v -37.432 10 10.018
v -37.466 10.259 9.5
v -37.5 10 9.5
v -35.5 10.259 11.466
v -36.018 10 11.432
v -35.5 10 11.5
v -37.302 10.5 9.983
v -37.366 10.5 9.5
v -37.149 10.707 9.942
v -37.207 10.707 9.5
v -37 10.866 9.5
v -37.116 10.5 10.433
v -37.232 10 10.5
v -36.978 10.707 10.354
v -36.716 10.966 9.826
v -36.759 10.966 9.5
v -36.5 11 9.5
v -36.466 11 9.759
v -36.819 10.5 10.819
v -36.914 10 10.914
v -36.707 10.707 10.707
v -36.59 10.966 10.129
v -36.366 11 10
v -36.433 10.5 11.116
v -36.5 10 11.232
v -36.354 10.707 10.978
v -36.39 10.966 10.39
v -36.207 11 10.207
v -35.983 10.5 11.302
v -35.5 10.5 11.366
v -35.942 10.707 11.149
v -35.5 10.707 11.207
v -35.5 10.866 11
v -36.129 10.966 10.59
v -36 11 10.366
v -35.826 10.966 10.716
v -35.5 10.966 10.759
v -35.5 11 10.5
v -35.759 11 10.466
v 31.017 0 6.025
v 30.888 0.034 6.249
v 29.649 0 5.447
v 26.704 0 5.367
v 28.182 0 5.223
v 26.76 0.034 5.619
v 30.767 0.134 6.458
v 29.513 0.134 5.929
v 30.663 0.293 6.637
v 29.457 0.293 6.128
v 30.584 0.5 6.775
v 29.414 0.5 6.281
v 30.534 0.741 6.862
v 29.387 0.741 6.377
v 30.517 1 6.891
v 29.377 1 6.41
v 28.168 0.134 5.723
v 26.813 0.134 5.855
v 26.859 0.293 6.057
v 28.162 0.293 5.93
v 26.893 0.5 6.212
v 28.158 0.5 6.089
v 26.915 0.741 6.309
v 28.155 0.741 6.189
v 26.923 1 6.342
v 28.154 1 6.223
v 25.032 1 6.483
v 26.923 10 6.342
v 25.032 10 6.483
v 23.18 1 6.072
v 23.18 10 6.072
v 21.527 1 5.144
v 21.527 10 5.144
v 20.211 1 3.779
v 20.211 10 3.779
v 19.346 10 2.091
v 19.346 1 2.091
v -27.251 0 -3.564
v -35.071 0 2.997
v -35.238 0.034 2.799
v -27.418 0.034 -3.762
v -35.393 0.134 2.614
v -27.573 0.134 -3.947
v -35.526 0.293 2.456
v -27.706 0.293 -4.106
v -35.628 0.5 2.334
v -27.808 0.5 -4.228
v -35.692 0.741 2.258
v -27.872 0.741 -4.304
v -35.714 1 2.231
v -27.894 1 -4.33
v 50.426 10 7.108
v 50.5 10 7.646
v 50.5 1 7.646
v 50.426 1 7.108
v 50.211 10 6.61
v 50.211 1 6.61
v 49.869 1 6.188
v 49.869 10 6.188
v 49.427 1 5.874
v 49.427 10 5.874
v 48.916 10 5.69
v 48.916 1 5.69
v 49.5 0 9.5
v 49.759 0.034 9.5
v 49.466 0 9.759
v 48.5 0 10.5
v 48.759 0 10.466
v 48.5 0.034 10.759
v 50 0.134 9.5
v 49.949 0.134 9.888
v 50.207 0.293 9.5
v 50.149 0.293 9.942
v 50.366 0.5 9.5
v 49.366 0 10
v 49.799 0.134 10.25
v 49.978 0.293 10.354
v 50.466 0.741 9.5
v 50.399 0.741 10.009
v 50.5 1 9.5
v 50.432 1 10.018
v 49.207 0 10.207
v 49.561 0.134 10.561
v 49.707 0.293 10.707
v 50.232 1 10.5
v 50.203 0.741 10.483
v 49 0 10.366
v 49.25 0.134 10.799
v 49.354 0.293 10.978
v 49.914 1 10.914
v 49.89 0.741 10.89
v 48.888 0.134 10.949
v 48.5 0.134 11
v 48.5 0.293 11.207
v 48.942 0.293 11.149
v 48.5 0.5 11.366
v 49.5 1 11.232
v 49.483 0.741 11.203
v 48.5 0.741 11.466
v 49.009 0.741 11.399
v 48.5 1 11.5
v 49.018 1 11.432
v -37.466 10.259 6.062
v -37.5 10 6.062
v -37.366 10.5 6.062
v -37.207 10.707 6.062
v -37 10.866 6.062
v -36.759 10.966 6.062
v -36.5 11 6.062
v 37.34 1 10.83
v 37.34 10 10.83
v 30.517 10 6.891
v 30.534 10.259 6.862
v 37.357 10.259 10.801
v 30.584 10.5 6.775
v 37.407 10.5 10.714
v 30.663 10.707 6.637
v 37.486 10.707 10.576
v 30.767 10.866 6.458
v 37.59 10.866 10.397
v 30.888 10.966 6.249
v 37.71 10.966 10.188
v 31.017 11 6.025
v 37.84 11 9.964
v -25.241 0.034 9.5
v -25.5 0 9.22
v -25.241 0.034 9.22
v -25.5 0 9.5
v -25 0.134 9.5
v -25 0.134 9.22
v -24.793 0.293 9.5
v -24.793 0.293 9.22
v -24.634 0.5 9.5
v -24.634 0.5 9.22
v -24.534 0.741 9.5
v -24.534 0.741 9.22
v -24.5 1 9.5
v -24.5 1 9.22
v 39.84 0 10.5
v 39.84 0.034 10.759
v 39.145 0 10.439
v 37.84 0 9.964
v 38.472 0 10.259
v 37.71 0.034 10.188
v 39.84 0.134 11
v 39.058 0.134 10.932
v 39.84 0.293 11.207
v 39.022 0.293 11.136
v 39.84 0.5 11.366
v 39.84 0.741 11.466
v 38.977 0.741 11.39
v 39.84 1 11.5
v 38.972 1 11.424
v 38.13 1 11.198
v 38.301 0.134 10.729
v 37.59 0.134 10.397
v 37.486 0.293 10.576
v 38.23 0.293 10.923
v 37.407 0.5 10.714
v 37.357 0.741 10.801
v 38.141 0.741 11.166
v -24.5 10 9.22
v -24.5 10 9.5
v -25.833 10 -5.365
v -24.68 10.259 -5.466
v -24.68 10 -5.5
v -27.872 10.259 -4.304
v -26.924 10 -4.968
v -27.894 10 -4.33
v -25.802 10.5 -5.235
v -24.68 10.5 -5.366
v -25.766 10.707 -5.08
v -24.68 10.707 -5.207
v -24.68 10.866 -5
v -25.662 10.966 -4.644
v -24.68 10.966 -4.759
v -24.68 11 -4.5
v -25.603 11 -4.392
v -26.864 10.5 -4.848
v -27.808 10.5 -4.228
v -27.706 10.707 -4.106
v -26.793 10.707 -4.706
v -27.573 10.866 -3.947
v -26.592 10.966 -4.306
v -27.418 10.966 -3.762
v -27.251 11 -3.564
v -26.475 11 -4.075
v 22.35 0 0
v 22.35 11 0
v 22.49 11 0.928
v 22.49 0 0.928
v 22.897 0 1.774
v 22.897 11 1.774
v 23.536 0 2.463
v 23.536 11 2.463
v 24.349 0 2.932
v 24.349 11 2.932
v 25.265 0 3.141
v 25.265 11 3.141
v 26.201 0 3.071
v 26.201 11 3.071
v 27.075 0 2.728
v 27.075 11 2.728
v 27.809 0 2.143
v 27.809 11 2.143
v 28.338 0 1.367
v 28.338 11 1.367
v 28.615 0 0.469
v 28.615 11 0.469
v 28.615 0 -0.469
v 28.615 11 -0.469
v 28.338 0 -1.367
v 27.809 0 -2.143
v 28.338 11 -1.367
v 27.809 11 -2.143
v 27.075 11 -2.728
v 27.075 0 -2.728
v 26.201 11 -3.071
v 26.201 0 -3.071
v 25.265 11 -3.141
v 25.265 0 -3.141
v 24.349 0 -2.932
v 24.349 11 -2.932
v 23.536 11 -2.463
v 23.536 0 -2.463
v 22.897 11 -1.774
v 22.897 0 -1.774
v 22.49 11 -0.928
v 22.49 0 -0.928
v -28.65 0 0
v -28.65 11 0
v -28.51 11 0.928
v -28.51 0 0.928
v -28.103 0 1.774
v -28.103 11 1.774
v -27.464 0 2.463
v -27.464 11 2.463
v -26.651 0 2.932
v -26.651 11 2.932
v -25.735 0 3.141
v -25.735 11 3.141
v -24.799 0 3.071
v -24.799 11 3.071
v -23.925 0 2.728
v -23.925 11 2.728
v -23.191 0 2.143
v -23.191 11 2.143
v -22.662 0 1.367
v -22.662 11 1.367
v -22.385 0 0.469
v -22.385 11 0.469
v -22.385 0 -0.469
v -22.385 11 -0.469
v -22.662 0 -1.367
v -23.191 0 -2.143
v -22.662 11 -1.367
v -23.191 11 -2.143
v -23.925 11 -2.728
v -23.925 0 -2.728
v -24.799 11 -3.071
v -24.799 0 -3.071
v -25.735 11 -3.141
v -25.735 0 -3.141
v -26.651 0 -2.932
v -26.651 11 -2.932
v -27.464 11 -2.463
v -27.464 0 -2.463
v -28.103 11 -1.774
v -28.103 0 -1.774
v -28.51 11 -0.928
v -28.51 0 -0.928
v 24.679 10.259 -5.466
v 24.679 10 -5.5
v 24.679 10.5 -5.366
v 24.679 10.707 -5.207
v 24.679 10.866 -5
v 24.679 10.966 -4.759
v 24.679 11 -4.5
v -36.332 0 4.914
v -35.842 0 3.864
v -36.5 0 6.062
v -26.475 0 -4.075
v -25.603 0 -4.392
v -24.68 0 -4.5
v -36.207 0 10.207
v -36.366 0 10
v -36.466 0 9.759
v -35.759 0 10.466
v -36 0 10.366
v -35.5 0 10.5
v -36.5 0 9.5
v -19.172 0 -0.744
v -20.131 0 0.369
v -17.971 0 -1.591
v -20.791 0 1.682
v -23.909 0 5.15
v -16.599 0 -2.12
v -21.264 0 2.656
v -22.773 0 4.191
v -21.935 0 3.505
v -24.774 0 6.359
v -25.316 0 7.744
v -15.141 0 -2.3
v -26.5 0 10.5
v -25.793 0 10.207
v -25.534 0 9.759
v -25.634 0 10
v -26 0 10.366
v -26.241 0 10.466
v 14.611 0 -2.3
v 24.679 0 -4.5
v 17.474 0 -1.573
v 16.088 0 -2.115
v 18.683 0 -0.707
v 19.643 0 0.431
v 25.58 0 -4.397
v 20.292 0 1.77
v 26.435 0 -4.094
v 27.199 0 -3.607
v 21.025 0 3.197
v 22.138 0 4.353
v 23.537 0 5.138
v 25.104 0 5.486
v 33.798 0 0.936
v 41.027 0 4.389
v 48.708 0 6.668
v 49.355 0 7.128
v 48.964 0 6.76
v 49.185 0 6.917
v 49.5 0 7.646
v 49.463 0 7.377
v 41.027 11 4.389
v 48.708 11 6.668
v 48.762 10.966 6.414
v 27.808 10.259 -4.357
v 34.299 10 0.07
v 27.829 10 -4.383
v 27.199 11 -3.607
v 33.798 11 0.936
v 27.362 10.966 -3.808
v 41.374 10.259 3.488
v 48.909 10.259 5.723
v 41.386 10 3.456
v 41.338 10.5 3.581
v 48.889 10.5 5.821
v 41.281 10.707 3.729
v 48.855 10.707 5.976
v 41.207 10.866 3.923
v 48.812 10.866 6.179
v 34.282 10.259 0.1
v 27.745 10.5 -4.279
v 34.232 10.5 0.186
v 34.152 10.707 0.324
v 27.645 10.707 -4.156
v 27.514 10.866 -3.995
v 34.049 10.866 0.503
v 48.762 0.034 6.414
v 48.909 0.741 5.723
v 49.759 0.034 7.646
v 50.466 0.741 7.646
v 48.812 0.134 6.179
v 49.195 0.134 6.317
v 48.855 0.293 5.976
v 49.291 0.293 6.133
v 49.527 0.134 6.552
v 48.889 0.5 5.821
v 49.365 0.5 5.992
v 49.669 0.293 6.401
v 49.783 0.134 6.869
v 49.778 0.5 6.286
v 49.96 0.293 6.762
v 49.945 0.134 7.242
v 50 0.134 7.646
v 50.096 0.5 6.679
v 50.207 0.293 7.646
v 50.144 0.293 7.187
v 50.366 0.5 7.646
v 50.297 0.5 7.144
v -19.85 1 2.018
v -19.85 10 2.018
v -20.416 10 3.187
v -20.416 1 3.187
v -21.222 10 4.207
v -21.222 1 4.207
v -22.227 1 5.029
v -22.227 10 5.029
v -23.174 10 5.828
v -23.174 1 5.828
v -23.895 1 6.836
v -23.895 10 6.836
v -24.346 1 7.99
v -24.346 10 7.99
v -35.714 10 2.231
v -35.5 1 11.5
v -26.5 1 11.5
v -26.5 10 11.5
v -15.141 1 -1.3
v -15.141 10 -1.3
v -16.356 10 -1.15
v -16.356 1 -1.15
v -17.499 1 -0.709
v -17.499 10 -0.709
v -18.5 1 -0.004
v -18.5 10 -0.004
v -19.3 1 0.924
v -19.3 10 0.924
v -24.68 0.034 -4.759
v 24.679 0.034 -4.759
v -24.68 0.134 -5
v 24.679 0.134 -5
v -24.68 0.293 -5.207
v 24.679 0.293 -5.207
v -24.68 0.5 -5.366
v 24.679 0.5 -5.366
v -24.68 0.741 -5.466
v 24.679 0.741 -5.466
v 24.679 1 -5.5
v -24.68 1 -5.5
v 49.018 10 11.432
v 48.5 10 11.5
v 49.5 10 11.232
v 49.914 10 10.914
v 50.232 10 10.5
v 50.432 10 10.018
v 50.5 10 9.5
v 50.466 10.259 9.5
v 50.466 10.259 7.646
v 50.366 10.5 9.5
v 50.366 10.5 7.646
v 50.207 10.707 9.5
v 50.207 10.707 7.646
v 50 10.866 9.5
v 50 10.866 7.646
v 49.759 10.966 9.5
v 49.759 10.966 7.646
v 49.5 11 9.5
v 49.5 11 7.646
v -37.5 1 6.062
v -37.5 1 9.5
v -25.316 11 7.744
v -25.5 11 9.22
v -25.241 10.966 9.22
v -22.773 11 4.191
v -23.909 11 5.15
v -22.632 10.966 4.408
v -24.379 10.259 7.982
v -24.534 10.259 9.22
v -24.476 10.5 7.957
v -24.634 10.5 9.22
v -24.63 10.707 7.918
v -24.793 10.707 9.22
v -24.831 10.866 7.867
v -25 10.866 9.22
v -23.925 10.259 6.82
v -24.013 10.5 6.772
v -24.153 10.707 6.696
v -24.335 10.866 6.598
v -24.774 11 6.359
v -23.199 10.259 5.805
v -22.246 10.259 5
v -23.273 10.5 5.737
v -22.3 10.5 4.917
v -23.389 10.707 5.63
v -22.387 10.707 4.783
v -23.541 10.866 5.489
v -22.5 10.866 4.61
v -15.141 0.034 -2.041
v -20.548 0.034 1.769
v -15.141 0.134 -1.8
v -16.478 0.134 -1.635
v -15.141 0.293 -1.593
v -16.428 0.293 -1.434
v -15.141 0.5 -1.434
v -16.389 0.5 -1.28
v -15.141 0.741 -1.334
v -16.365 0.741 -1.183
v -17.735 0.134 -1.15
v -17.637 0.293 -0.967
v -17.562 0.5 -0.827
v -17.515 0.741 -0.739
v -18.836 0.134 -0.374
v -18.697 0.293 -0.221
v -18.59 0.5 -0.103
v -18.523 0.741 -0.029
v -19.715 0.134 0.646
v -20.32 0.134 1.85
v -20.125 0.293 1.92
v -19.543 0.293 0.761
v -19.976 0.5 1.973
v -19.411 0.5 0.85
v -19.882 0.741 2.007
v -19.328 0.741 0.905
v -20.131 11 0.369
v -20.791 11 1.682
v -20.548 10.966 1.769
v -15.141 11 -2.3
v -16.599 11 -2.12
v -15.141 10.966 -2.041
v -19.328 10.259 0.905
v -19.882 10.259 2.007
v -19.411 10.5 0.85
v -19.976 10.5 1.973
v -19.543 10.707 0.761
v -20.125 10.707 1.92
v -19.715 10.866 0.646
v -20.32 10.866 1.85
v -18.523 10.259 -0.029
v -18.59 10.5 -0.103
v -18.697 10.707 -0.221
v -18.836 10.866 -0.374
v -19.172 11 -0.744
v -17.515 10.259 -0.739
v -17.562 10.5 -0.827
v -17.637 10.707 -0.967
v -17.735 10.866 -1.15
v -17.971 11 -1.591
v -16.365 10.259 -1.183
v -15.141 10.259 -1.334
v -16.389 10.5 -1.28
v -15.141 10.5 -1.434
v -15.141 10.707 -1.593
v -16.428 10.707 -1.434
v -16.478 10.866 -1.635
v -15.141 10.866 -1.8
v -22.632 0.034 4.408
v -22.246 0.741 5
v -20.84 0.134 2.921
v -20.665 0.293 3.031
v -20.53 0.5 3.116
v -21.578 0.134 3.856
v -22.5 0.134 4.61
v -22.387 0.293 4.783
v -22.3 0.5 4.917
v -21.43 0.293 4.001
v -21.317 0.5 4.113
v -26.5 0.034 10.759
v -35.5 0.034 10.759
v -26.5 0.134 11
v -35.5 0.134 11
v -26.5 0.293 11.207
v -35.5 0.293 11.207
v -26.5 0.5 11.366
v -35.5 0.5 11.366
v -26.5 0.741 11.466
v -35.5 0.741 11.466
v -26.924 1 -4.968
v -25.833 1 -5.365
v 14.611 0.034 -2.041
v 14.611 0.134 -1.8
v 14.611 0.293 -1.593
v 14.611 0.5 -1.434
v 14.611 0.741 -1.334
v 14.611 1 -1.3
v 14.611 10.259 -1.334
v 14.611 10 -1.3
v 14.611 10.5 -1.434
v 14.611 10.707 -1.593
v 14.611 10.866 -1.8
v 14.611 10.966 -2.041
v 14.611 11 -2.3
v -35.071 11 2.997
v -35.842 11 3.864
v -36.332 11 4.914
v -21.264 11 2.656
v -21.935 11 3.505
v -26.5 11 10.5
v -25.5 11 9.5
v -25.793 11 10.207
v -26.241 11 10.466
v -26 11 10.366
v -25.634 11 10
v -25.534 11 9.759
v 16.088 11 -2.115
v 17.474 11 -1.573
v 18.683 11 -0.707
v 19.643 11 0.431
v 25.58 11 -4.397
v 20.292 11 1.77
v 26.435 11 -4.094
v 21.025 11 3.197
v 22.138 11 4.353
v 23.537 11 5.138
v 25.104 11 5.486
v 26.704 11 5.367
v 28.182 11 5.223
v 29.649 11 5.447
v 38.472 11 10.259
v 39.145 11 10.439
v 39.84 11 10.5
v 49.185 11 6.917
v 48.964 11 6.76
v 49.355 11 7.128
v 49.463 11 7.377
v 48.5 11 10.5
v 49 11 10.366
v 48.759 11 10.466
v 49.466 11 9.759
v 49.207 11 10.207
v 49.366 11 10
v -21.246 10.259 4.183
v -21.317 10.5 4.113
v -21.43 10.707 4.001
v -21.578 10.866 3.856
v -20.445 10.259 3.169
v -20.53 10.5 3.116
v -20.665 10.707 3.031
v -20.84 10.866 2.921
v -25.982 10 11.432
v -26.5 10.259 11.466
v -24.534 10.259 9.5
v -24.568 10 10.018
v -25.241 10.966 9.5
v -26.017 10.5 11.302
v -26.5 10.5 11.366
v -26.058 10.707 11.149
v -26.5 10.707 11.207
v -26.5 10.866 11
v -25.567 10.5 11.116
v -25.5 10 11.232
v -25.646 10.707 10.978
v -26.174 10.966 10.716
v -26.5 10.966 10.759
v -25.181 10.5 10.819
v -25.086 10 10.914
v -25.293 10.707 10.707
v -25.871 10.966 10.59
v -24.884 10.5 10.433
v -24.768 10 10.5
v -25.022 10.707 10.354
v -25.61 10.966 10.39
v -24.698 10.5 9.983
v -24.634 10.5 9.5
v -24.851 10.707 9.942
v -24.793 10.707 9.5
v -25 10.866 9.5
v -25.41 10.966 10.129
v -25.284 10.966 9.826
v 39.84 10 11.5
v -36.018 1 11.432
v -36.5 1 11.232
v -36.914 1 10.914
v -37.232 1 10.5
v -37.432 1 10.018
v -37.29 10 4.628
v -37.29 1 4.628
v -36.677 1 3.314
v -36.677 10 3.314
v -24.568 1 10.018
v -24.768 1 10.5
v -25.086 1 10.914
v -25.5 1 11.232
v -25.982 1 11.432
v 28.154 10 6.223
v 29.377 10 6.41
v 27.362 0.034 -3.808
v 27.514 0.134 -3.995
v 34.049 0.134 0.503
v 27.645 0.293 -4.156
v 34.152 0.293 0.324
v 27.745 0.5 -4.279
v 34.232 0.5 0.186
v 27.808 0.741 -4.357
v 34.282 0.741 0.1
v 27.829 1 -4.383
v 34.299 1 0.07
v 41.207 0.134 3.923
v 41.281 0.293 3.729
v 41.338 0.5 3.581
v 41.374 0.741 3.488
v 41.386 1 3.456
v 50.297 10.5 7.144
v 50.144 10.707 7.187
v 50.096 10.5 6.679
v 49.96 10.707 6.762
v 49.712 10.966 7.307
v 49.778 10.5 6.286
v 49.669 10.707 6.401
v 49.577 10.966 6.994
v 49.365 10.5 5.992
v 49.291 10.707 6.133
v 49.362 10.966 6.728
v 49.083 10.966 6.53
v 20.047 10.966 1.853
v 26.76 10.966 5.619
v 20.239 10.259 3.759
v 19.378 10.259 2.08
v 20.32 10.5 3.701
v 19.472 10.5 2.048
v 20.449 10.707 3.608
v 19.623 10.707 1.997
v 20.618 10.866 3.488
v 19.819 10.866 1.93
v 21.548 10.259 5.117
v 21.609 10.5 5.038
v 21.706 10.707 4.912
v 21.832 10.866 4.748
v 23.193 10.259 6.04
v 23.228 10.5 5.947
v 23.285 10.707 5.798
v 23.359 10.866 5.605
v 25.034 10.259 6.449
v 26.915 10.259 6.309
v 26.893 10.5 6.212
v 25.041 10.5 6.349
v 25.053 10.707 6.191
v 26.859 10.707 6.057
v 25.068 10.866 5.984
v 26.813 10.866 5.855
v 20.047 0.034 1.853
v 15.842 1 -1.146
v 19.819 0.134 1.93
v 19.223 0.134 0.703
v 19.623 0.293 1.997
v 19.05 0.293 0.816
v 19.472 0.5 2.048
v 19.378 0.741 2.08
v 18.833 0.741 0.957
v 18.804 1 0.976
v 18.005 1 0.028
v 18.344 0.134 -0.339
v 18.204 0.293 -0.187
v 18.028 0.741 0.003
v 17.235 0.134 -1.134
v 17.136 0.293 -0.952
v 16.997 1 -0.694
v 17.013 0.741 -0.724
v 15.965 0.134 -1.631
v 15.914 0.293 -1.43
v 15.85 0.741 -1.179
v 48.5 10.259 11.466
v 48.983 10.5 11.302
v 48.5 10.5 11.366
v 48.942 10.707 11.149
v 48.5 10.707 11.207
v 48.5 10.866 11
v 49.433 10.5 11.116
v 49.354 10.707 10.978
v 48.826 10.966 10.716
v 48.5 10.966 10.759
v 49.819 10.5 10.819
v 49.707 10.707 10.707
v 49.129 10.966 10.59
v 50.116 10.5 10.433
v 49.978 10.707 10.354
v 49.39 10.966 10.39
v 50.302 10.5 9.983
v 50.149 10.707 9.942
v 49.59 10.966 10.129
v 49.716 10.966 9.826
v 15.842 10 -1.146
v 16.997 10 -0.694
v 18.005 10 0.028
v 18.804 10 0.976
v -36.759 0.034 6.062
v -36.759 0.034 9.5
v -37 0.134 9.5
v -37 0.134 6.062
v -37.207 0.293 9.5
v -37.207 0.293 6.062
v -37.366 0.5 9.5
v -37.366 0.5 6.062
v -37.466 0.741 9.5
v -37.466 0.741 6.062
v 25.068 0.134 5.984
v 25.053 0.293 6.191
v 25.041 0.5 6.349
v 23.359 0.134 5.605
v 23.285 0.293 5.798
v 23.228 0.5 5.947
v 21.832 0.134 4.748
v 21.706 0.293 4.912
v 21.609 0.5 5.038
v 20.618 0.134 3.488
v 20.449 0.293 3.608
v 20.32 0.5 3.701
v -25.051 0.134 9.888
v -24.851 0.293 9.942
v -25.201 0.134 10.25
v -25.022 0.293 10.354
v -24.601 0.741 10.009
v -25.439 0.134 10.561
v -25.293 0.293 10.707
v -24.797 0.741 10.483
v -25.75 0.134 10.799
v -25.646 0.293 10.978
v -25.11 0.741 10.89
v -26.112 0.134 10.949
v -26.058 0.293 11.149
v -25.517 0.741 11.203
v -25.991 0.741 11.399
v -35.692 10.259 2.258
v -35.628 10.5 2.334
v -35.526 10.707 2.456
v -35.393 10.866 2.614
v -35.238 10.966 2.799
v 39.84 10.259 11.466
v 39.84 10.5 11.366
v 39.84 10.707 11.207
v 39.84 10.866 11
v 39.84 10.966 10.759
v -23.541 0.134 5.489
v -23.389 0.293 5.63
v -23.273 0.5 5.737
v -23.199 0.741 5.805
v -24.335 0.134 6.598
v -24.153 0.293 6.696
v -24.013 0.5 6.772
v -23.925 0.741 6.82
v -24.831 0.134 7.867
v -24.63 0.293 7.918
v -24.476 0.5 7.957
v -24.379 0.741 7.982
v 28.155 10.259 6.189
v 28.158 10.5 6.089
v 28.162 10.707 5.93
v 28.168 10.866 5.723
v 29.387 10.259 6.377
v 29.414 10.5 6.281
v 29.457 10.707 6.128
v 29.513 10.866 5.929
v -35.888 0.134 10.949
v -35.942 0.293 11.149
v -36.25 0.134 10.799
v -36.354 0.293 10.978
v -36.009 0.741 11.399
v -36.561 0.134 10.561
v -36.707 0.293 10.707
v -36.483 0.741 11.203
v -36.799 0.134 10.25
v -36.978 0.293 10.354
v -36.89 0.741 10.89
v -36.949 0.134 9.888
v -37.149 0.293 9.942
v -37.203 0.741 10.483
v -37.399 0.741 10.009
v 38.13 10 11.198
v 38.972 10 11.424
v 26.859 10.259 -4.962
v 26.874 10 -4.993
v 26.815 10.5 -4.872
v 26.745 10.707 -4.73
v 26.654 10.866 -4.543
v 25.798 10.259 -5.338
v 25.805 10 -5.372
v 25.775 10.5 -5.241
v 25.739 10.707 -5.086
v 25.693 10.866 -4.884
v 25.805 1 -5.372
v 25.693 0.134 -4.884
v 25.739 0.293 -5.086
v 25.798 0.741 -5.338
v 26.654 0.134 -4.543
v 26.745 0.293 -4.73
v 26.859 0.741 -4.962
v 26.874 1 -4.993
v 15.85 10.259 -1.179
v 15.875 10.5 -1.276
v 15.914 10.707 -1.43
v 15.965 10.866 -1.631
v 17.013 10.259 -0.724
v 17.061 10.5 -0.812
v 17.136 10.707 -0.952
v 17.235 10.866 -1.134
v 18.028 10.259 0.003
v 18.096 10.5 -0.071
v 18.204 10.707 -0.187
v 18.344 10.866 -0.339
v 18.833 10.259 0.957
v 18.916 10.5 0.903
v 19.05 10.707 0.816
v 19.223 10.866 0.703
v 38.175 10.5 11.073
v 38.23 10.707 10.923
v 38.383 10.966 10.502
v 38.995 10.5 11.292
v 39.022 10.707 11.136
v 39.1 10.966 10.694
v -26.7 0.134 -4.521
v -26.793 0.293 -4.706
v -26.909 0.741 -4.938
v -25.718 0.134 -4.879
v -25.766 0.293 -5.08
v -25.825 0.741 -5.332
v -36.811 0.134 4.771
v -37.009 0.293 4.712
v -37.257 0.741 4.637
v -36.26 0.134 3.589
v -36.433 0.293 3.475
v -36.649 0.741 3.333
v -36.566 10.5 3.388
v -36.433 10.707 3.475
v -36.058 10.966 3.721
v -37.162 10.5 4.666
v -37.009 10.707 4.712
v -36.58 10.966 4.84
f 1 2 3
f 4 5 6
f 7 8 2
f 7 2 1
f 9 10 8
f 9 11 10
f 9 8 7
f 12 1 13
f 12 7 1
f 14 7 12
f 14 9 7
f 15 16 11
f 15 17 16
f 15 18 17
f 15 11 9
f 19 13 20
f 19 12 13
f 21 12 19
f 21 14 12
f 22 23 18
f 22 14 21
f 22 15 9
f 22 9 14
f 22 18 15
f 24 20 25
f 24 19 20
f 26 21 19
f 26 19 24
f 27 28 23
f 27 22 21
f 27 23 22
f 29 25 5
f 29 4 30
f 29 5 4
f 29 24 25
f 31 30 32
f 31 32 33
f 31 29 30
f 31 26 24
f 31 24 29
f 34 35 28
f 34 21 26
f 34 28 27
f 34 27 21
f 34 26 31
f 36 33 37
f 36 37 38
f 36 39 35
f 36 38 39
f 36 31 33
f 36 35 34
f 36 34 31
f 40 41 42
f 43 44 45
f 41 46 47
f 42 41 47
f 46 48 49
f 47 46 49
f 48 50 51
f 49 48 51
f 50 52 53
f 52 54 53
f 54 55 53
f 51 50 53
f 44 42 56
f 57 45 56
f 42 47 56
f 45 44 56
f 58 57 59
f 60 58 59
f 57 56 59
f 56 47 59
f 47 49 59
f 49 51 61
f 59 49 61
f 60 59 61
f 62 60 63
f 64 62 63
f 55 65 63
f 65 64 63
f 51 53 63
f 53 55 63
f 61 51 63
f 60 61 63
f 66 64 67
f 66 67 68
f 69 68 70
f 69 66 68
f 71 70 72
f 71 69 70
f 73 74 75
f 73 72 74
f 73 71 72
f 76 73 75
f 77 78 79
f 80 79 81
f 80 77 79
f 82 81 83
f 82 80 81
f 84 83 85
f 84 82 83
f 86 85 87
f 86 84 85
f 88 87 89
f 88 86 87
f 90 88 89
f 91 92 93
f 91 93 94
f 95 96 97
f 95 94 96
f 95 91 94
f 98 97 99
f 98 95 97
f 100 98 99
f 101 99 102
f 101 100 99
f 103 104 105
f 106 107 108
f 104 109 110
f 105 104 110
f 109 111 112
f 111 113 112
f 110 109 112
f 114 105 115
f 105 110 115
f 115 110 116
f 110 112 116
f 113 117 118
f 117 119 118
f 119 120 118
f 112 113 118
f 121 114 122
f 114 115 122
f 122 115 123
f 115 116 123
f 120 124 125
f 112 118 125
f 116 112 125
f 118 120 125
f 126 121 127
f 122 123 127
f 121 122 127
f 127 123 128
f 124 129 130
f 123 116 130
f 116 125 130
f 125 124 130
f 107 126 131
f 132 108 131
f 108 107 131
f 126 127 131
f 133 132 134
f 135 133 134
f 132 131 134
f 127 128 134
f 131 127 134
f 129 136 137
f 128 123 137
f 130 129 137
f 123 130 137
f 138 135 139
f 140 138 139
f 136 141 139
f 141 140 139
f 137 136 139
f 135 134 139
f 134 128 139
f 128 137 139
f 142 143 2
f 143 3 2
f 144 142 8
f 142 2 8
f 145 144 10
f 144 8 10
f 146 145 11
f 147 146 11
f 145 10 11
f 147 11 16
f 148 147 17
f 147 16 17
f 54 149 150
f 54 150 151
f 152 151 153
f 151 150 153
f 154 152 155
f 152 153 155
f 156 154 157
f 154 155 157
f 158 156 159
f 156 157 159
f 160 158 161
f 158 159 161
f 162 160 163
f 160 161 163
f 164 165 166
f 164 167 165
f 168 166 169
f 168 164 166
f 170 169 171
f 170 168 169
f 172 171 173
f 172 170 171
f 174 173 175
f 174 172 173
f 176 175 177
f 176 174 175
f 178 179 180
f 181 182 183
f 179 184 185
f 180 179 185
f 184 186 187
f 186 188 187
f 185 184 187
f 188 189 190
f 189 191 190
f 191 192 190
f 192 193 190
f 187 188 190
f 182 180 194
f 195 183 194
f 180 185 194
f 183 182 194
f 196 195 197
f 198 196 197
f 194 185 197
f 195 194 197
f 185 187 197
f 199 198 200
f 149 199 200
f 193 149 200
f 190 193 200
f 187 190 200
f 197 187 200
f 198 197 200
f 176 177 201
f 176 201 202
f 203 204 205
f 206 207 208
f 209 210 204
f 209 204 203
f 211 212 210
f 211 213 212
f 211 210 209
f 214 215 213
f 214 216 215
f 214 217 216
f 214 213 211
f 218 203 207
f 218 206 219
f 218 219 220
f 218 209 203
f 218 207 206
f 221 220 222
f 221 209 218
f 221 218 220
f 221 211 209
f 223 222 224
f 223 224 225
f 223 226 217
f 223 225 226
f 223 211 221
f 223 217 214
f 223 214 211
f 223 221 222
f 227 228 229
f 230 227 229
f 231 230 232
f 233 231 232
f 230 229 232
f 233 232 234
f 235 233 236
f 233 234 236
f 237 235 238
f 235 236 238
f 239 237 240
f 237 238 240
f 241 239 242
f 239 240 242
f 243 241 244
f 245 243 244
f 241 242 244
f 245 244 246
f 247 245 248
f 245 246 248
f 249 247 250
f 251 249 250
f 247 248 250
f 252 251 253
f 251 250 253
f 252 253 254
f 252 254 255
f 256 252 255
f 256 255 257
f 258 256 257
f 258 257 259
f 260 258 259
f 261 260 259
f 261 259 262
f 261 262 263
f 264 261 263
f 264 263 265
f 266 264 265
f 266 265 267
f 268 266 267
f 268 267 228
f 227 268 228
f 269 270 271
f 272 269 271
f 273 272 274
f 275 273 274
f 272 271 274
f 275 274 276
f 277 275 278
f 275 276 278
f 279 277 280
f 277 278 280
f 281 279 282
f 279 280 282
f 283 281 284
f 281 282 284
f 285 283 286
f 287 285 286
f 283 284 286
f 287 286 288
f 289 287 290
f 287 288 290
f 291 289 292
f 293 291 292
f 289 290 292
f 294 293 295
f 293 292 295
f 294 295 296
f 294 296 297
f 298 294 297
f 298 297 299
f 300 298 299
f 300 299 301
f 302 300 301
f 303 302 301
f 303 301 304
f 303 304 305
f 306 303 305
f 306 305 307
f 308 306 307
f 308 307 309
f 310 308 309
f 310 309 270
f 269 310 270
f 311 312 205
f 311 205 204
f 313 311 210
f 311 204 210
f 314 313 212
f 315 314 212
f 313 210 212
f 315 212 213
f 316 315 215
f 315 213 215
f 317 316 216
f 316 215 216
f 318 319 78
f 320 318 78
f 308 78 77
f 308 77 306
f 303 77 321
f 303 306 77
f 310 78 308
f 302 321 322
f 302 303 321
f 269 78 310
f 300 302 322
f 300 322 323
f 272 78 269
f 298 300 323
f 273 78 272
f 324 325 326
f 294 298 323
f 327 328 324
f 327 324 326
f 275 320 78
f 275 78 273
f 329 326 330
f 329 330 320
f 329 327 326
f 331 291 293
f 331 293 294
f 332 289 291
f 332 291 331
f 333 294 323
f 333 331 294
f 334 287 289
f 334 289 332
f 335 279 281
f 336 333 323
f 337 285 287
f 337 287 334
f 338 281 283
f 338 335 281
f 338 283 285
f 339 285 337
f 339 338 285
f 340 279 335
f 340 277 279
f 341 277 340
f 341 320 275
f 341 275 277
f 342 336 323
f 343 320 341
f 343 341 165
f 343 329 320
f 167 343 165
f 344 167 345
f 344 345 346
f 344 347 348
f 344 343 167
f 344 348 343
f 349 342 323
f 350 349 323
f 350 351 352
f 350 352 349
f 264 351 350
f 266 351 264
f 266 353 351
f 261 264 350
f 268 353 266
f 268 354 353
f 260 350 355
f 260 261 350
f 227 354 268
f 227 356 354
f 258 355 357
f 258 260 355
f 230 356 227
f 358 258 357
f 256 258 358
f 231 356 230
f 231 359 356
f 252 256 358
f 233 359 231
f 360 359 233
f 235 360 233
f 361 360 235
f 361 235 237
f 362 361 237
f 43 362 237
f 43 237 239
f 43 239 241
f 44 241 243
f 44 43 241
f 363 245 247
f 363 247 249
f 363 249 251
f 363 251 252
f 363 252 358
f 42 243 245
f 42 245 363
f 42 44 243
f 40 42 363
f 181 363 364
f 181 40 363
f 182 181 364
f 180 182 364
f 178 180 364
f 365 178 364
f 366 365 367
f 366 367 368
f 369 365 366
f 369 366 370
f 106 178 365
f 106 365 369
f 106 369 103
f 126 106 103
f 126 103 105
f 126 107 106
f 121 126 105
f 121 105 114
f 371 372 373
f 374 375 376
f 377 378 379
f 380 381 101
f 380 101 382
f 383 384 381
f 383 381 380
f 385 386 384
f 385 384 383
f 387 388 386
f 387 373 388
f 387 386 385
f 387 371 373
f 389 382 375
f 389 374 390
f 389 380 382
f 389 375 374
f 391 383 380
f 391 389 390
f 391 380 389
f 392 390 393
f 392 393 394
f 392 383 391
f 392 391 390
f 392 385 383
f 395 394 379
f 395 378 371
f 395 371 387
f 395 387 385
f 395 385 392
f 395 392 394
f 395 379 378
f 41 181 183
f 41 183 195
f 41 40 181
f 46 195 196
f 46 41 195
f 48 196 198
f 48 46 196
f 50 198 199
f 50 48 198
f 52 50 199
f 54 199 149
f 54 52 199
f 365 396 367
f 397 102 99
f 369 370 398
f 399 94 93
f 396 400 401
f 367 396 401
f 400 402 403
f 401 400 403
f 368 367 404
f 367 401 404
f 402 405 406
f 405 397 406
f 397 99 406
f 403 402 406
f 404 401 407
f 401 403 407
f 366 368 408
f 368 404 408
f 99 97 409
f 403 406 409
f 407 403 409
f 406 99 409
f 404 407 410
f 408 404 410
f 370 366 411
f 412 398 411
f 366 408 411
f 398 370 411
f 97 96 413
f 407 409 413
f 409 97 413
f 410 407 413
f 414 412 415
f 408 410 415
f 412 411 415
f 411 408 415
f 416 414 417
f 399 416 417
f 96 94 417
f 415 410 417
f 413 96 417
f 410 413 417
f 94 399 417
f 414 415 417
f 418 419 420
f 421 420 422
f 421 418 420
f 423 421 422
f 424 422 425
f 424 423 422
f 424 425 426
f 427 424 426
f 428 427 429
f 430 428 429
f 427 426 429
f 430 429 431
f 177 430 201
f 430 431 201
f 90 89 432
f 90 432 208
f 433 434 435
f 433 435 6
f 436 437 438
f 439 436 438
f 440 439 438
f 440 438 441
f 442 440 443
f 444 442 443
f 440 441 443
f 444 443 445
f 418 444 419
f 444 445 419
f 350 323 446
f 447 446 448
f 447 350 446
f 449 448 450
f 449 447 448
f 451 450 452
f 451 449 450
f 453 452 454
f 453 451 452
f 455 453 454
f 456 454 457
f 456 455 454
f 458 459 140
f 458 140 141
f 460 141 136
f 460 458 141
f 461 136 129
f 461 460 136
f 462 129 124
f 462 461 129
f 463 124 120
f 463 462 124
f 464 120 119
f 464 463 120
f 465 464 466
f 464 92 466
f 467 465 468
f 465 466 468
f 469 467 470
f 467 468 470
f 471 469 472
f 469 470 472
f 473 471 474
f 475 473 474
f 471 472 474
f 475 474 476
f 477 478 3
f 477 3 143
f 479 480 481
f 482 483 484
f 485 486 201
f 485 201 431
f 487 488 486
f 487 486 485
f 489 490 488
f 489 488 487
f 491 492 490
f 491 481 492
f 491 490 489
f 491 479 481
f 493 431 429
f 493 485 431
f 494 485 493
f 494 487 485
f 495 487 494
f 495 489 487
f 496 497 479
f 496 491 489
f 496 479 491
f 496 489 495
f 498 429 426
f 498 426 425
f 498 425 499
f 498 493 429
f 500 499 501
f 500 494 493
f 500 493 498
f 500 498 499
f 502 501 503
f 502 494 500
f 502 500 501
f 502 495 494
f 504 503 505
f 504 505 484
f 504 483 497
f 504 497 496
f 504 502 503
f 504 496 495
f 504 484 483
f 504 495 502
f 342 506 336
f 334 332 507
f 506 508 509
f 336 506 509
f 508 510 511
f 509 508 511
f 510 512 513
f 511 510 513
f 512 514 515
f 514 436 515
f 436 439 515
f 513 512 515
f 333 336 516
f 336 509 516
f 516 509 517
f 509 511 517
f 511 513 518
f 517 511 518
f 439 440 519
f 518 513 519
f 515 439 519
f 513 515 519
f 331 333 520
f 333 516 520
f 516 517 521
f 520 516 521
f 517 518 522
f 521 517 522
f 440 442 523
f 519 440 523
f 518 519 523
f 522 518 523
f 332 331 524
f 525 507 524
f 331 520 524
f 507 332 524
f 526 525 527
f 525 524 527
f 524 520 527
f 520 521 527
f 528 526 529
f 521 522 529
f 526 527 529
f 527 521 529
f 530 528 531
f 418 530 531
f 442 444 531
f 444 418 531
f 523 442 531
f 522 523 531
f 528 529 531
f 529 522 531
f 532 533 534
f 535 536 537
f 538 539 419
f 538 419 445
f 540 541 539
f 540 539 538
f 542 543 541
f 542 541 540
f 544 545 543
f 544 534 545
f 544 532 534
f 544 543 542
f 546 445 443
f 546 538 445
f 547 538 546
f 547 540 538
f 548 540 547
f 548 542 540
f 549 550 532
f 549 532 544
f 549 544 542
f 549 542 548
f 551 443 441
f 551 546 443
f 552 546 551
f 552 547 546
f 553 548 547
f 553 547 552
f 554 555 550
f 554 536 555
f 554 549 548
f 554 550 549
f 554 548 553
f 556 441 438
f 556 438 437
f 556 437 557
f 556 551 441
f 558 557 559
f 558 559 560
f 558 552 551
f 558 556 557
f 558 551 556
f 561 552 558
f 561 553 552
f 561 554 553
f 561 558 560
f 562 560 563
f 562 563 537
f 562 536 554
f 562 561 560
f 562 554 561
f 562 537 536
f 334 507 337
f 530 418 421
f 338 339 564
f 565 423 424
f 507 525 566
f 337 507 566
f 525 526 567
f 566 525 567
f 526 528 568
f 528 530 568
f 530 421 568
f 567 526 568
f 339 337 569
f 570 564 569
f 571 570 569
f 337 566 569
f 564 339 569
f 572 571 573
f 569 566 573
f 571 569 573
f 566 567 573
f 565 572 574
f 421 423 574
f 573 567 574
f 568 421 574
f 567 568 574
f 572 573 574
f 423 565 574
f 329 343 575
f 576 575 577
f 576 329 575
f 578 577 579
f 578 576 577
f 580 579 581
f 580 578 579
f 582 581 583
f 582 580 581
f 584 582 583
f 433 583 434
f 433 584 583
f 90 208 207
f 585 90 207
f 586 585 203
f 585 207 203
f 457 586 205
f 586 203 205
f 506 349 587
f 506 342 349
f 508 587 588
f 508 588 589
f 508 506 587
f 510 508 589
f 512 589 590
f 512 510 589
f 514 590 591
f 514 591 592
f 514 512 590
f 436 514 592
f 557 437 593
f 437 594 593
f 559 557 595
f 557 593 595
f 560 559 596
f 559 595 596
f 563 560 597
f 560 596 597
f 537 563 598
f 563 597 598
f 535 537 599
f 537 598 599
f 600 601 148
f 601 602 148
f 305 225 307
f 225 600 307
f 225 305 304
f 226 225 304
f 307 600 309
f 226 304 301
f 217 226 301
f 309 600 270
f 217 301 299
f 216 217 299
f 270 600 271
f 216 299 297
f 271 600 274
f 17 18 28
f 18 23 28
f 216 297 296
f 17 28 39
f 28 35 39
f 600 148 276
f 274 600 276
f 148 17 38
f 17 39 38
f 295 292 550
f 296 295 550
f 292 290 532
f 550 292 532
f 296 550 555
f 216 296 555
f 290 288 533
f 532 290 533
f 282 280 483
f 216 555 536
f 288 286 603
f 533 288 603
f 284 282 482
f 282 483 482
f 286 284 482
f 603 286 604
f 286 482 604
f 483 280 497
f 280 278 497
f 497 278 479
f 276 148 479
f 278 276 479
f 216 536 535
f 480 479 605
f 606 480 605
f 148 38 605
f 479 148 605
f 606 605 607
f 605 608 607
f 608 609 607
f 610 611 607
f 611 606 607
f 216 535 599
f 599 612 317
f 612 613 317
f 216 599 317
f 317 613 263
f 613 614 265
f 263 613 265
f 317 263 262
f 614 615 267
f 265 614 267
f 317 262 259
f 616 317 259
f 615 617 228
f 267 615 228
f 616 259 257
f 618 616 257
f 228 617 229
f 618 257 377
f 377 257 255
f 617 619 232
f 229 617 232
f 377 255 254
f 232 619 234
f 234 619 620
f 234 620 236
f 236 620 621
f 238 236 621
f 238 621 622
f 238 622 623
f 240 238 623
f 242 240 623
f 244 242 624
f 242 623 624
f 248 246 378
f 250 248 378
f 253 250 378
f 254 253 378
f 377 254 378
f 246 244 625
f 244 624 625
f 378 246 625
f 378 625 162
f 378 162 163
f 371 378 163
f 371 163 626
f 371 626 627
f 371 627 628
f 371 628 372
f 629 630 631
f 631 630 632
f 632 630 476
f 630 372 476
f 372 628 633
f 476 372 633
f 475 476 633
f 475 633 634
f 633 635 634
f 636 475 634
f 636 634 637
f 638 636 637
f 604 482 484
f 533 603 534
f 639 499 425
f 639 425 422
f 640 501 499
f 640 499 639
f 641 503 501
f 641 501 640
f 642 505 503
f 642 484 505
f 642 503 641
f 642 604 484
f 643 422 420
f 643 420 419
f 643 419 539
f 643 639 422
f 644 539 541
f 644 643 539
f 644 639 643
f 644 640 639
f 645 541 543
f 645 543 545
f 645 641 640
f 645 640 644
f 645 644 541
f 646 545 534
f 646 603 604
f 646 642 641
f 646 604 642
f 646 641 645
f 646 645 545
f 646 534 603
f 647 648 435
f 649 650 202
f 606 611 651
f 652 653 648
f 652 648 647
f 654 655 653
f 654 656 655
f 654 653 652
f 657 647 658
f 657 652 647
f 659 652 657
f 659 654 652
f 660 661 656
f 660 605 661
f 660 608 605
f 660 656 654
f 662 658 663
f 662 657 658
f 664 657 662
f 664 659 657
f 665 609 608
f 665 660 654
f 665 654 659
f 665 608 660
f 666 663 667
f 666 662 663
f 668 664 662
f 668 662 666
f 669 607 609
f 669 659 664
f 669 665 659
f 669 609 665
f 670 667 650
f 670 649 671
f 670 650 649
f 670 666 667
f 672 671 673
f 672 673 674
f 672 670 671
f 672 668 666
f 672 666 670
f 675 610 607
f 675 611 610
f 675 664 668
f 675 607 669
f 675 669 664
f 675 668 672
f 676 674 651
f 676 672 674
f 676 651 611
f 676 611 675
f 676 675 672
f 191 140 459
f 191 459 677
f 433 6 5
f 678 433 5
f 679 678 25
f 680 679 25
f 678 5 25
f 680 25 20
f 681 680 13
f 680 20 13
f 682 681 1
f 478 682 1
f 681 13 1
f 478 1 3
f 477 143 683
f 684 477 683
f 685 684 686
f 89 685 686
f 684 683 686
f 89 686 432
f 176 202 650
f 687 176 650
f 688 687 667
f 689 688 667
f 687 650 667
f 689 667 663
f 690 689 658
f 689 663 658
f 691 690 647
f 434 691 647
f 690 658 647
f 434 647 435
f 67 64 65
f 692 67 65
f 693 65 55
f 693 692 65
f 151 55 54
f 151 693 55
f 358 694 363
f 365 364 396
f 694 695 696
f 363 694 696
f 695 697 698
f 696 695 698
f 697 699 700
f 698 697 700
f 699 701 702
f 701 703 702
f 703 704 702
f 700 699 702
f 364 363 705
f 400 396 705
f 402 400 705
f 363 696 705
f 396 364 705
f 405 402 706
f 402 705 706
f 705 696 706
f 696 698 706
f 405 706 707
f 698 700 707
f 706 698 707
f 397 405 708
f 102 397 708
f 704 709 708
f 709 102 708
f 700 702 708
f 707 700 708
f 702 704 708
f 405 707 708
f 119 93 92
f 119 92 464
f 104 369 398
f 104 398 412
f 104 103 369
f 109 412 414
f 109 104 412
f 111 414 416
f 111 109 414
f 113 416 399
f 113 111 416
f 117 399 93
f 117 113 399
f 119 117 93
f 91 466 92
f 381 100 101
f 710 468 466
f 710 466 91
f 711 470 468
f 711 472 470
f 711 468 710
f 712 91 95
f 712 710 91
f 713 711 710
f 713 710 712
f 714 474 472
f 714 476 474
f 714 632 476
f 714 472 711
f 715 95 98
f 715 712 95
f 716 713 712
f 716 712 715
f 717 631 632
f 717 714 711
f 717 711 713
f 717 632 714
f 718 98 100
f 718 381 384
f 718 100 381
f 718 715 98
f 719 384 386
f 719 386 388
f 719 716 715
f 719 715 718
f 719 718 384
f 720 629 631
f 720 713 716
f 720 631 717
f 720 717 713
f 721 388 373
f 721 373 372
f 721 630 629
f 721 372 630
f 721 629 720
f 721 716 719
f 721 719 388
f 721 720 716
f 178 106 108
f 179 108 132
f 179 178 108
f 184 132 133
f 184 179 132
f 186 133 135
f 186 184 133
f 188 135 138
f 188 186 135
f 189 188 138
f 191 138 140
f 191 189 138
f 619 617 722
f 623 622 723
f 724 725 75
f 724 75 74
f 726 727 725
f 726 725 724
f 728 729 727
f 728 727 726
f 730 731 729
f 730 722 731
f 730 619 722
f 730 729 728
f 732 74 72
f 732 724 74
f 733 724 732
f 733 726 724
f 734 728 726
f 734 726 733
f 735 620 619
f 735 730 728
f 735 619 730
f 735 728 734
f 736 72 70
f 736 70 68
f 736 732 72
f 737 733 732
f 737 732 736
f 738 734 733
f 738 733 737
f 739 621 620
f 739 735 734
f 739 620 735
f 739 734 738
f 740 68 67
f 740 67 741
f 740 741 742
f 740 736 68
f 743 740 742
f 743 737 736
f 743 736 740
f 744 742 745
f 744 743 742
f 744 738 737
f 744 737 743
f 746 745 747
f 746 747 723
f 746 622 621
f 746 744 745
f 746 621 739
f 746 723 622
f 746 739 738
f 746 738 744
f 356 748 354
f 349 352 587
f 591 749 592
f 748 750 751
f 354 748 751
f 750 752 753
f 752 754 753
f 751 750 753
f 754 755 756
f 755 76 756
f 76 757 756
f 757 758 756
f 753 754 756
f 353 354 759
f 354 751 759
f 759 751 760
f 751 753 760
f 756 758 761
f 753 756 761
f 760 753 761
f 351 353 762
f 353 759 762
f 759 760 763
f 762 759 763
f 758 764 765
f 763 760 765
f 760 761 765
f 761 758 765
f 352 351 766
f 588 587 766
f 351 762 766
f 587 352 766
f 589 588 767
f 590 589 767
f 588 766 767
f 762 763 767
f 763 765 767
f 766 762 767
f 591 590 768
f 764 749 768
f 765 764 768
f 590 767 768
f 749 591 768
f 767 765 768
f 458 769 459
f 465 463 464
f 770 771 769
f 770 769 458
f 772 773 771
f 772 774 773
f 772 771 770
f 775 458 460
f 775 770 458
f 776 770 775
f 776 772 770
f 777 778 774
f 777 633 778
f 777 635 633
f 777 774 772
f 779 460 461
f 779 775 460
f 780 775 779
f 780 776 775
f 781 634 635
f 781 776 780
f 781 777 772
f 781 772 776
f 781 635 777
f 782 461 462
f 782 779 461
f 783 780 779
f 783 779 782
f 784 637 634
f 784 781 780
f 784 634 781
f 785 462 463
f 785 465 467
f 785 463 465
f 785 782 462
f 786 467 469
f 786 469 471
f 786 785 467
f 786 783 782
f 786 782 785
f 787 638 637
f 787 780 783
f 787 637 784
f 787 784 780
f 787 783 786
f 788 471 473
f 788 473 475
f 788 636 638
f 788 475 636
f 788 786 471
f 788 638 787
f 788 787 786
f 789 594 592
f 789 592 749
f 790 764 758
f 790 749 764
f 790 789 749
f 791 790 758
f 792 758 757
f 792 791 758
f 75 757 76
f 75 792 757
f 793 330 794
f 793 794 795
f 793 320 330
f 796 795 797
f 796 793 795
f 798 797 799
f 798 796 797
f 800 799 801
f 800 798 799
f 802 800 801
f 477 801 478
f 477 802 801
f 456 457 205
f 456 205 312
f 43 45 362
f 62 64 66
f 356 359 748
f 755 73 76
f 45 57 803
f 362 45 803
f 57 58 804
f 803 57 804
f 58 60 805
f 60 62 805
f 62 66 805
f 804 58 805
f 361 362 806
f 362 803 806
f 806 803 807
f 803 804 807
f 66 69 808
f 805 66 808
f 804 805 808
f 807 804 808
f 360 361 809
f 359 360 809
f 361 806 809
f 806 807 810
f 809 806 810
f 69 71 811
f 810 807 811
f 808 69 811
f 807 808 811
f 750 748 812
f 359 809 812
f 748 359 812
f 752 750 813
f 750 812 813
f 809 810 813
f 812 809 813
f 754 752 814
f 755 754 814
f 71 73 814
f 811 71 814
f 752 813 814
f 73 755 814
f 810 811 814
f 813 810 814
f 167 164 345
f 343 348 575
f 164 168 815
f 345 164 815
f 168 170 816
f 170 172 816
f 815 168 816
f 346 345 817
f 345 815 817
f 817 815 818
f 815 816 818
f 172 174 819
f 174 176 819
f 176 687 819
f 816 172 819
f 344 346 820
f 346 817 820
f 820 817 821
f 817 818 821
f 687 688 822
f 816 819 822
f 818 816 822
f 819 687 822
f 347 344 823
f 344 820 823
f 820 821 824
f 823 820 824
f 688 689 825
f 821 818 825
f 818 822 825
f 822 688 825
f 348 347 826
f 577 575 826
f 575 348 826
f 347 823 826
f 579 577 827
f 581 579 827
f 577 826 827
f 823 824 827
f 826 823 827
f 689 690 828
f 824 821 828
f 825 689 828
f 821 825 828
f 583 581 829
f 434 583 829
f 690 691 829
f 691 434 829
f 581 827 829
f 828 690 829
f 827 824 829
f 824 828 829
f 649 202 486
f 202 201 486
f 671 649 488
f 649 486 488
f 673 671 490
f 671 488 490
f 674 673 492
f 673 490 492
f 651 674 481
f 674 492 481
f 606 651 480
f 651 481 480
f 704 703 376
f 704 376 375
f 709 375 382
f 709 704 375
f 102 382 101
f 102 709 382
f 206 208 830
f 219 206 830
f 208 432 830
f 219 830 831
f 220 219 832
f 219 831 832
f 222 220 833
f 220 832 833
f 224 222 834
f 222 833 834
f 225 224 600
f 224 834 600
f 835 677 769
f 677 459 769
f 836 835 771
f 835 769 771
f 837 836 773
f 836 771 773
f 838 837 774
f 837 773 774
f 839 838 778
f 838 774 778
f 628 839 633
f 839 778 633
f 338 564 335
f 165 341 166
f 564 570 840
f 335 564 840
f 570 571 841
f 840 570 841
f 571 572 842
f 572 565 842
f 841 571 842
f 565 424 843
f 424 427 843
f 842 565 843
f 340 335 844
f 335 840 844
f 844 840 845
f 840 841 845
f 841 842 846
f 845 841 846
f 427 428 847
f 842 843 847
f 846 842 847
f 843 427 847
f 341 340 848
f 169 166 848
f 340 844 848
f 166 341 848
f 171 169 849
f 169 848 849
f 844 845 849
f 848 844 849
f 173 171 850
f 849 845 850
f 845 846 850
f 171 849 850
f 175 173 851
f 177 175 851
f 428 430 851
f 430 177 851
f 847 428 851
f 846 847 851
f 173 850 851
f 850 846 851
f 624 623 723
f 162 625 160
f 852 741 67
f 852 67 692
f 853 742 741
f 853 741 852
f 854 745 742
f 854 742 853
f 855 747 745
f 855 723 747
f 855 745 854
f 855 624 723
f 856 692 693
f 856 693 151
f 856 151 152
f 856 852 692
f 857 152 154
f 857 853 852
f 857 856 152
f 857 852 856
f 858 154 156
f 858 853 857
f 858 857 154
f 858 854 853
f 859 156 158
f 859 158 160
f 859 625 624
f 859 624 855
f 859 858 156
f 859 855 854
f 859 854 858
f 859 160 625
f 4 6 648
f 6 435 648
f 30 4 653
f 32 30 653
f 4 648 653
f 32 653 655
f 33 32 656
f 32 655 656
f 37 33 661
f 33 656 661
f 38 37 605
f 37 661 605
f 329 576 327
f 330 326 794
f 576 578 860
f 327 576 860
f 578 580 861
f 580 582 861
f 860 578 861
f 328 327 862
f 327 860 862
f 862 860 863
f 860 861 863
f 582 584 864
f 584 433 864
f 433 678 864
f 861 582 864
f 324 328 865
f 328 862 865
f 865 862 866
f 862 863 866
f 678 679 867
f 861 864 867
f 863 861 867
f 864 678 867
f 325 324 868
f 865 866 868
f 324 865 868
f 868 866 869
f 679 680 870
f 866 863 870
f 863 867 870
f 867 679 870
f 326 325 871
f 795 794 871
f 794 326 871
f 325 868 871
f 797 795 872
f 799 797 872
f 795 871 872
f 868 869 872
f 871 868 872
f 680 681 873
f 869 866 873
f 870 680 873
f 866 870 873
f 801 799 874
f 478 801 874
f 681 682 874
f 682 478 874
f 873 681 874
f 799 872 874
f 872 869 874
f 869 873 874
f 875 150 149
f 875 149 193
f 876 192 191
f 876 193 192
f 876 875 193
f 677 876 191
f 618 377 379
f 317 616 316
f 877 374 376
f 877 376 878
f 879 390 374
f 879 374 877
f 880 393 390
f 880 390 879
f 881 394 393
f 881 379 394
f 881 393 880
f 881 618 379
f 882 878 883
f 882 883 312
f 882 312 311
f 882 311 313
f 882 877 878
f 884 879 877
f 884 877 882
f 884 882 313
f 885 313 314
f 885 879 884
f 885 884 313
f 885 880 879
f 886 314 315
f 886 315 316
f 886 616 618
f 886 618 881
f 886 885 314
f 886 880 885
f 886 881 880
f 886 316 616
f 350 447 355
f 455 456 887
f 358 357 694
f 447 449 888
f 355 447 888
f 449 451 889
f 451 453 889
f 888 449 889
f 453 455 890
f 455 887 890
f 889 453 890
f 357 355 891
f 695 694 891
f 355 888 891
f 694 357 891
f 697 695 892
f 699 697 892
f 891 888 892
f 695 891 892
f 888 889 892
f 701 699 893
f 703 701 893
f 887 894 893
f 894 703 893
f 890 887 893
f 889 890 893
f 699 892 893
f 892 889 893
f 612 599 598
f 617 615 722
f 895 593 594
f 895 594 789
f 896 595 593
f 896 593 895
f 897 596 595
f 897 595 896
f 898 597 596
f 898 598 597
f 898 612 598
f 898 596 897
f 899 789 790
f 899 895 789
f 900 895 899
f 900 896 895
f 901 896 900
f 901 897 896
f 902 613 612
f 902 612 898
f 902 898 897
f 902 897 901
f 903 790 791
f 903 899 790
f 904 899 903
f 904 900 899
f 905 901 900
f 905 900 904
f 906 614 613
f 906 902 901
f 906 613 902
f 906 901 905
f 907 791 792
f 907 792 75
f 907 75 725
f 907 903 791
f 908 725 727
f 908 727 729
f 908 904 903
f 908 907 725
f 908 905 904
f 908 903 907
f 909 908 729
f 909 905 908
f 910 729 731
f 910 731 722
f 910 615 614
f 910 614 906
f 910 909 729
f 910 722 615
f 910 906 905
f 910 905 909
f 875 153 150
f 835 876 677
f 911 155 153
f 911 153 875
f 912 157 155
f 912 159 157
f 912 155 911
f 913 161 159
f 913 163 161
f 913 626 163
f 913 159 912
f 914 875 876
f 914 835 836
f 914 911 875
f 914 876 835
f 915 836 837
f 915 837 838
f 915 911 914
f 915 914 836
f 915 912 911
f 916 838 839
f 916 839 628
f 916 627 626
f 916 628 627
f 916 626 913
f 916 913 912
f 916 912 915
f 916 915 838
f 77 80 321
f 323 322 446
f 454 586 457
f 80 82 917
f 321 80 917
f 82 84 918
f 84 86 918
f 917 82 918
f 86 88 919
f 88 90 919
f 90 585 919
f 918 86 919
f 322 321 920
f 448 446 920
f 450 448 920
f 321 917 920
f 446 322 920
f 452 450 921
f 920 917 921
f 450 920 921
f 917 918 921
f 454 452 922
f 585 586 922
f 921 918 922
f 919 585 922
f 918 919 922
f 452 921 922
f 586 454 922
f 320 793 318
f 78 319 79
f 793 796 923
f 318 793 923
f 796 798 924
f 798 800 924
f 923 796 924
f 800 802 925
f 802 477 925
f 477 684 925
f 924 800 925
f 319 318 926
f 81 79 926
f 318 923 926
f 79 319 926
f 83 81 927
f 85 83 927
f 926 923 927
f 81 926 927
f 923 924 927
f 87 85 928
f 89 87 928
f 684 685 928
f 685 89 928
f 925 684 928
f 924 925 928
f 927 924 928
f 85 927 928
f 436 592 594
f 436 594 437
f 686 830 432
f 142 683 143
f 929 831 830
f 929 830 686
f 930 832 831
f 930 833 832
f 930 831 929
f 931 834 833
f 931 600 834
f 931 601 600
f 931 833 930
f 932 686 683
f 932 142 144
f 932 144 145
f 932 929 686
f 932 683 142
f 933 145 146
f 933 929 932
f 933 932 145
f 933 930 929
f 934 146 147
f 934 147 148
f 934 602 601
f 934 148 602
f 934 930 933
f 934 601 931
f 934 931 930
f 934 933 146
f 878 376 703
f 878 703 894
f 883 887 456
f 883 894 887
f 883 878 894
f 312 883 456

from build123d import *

# Parameters (mm, degrees)
F1_DEPTH = 11
F2_D     = 6.3
F3_R     = 5
F4_R     = 2
F5_R     = 1


with BuildPart() as f1:
    # F0 (on Front) → F1 (new body)
    with BuildSketch(Plane.XZ):
        with BuildLine():
            Line((19.1313266688, -1.3), (-19.6425261418, -1.3))
            ThreePointArc((-19.6425261418, -1.3), (-20.5226323435, 3.3504941743), (-24.5, 5.9160797831))
            Line((-24.5, 5.9160797831), (-24.5, 11.5))
            Line((-24.5, 11.5), (-37.5, 11.5))
            Line((-37.5, 11.5), (-37.5, 3.730095943))
            Line((-37.5, 3.730095943), (-26.5, -5.5))
            Line((-26.5, -5.5), (26.5, -5.5))
            ThreePointArc((26.5, -5.5), (37.7208276523, 1.8760988126), (50.5, 6))
            Line((50.5, 6), (50.5, 11.5))
            Line((50.5, 11.5), (38.5, 11.5))
            Line((38.5, 11.5), (28.5361144551, 5.7473479985))
            ThreePointArc((28.5361144551, 5.7473479985), (21.6022101623, 5.2016568881), (19.1313266688, -1.3))
        make_face()
    extrude(amount=-F1_DEPTH)

    # F2 (through all)
    with Locations(Plane.XZ):
        with Locations((25.5, 0), (-25.5, 0)):
            Hole(F2_D / 2)

    # F3
    f3_edges = [f1.edges().sort_by_distance(p)[0] for p in [
        (-24.5, 5.5, 5.91608),
        (-19.642526, 5.5, -1.3),
        (19.131327, 5.5, -1.3),
        (28.536114, 5.5, 5.747348),
        (-37.5, 5.5, 3.730096),
        (-26.5, 5.5, -5.5),
        (26.5, 5.5, -5.5),
        (38.5, 5.5, 11.5),
    ]]
    fillet(f3_edges, radius=F3_R)

    # F4
    f4_edges = [f1.edges().sort_by_distance(p)[0] for p in [
        (-24.5, 5.5, 11.5),
        (-37.5, 5.5, 11.5),
        (50.5, 5.5, 11.5),
        (50.5, 5.5, 6),
    ]]
    fillet(f4_edges, radius=F4_R)

    # F5
    f5_edges = [f1.edges().sort_by_distance(p)[0] for p in [
        (28.771496, 11, 6.278411),
        (-0.264736, 0, -1.3),
    ]]
    fillet(f5_edges, radius=F5_R)


solid = f1.part
